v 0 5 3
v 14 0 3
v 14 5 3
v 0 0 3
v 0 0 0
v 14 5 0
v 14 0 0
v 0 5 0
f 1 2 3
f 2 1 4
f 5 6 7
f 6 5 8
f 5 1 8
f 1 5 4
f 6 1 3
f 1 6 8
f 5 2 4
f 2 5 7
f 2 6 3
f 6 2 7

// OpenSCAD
translate([1.0, 2.5, 1.5]) color([0.21877355907286744, 0.817120303018883, 0.6342064135522842]) cube([2, 5, 3], center=true);
translate([3.0, 2.5, 1.5]) color([0.9365197161897865, 0.6021704873486543, 0.07399689426047196]) cube([2, 5, 3], center=true);
translate([5.0, 2.5, 1.5]) color([0.12444372203200982, 0.18852062230064282, 0.830086131214745]) cube([2, 5, 3], center=true);
translate([7.0, 2.5, 1.5]) color([0.11969547265179015, 0.09153185315534418, 0.8338444305994857]) cube([2, 5, 3], center=true);
translate([9.0, 2.5, 1.5]) color([0.11604613837891842, 0.6055041702213623, 0.19459095568233187]) cube([2, 5, 3], center=true);
translate([11.0, 2.5, 1.5]) color([0.9706919132543499, 0.7181133264593419, 0.47923365392220396]) cube([2, 5, 3], center=true);
translate([13.0, 2.5, 1.5]) color([0.7271552294548347, 0.06108489585644861, 0.6793471949009788]) cube([2, 5, 3], center=true);
